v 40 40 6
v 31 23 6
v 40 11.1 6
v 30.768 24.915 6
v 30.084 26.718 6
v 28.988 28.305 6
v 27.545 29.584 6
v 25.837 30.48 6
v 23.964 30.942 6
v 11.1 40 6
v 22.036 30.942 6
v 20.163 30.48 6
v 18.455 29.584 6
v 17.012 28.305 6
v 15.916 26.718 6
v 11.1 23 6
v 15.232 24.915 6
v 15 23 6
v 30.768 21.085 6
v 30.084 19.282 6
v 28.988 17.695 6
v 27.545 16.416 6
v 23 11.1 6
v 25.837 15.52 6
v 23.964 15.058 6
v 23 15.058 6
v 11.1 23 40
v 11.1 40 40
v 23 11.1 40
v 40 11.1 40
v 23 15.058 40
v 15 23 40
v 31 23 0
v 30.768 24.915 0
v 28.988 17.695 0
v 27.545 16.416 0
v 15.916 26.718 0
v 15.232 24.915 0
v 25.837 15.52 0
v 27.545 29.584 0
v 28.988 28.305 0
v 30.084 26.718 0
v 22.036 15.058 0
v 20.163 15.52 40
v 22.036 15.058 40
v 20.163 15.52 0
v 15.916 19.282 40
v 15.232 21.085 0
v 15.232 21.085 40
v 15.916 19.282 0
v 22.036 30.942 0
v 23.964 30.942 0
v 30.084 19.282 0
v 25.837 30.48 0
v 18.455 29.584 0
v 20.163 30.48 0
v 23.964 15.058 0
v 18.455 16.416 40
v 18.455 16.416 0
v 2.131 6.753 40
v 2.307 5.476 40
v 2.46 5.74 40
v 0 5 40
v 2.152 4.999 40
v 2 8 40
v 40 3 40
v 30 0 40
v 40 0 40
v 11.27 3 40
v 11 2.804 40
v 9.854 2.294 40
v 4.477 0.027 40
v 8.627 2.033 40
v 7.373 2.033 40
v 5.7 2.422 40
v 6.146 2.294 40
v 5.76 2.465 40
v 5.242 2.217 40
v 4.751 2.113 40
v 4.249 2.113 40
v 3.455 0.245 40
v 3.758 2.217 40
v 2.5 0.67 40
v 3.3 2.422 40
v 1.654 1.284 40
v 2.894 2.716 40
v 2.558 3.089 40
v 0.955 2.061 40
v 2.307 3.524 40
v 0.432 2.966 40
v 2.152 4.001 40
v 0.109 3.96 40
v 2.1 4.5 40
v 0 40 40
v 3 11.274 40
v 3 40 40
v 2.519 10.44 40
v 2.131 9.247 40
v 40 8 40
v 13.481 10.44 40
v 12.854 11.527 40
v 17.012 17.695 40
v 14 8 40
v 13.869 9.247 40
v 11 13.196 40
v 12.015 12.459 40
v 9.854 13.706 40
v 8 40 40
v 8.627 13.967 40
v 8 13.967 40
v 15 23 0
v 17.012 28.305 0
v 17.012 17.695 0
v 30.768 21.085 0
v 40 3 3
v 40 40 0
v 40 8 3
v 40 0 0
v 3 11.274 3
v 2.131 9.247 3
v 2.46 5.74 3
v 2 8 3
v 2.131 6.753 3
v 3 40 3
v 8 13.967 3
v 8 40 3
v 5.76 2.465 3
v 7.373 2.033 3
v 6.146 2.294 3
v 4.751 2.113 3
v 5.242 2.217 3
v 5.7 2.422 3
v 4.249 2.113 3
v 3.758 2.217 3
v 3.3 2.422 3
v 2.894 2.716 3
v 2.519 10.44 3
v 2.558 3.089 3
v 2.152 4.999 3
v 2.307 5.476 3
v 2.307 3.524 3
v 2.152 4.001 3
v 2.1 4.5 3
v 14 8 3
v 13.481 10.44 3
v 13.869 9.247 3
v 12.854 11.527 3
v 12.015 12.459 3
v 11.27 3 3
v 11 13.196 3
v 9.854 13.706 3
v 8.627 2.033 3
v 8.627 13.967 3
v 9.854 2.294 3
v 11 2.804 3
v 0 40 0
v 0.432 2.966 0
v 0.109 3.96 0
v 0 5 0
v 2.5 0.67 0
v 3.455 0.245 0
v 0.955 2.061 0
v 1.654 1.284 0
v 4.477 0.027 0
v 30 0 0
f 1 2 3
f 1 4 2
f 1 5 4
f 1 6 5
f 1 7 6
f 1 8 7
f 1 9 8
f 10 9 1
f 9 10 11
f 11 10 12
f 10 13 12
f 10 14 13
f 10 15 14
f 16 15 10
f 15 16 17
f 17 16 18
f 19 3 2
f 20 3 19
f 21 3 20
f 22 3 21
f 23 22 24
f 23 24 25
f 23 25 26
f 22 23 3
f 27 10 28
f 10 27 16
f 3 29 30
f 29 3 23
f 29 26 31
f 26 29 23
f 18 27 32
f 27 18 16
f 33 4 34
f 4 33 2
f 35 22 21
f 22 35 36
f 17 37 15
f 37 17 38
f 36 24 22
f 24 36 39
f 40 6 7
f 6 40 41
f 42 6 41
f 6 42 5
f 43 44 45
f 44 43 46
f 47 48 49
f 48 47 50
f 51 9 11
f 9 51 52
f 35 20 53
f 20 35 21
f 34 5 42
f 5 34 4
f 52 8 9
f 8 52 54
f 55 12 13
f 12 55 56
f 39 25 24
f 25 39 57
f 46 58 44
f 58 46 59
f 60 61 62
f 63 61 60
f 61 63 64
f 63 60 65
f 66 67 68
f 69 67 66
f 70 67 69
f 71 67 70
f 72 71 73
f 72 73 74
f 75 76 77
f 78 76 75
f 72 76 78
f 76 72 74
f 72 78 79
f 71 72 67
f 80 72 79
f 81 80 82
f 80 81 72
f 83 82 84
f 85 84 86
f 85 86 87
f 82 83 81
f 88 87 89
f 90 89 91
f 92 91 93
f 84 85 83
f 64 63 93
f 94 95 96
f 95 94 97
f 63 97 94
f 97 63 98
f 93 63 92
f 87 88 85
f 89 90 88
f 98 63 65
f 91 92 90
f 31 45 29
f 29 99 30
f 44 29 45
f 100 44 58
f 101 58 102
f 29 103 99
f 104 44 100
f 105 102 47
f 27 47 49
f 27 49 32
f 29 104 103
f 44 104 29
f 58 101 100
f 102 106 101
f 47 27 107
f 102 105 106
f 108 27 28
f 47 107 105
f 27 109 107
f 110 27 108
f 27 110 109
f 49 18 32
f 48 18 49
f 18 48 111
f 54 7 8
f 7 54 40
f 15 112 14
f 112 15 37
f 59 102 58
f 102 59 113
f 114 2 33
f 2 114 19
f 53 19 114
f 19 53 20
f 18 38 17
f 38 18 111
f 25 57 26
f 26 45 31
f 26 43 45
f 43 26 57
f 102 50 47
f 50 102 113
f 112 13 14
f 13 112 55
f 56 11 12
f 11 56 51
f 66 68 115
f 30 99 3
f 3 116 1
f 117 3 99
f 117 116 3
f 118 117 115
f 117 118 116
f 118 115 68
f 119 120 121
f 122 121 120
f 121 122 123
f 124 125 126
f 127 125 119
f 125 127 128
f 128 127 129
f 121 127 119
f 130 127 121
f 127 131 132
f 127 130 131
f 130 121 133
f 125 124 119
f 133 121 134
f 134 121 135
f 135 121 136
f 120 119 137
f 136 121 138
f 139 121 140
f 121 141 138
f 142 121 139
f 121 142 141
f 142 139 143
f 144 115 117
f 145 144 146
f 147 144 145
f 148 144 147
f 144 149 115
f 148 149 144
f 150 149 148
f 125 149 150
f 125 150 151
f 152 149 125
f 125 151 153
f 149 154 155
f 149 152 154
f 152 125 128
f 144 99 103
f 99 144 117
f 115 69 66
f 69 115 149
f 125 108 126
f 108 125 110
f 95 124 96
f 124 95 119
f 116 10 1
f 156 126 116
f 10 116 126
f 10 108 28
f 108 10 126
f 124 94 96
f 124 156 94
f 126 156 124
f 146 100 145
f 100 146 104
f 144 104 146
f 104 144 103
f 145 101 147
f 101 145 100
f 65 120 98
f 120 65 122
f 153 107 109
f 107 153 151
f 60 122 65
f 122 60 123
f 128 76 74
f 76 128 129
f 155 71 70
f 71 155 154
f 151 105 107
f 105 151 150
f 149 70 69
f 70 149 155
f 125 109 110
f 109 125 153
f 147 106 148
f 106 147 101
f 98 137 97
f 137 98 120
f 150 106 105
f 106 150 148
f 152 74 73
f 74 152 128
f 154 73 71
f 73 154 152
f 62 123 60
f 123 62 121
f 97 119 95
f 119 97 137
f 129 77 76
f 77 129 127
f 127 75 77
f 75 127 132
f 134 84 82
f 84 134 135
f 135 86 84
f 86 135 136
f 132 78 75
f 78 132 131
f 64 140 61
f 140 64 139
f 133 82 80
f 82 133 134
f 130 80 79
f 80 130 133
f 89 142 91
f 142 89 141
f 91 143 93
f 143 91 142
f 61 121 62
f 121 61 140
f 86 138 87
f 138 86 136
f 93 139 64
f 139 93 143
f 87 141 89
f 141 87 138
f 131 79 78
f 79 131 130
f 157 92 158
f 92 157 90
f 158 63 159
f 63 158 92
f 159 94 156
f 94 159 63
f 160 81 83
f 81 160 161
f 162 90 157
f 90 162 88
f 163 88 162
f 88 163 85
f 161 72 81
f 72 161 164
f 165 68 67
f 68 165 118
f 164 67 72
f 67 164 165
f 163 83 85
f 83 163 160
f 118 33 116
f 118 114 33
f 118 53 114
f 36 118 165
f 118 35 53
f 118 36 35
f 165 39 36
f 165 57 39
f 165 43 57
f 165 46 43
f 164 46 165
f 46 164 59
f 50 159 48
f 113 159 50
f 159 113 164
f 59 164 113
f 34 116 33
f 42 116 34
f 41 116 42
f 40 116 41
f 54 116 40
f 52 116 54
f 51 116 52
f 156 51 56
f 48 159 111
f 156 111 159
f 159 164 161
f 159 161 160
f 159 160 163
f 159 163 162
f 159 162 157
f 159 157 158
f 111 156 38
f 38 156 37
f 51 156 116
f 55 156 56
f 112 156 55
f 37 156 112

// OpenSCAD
tubing_dia     = 16;//based on tubing OD of 16 mm
tubing_offset  = tubing_dia/2 +7;//offset of center of tubing compared to aquarium inner corner
aquarium_walls_thickness = 5;//5mm thick glass 

angle_mount_thickness = 3;

cornerTubingHolder(tubingDia=tubing_dia,tubingOffset=tubing_offset,thickness=angle_mount_thickness,mountHeight=40,snapOnThickness=aquarium_walls_thickness);

//sideTubingHolder(tubingDia=tubing_dia, height =30, length=20, thickness=3, snapOnThickness= angle_mount_thickness);

//clip(height=40,length=20,innerDistance=5,thickness=3);
//steppedConnector2(id=15.5,minOd=17.5,maxOd=20.5,length=15);


module cornerTubingHolder(tubingDia, tubingOffset, thickness, mountHeight, snapOnThickness){
  width = 40;
  length=40;
  height= mountHeight;
  clearance = 0.1;
  baseThickness = thickness *2;

  offset = snapOnThickness+thickness;
  offset2 = thickness*1.5;
  cornerDia = 10;

  rheight = mountHeight -thickness;
  mountOffset = thickness;

  wallsPlusCutout = snapOnThickness +thickness*2;
  aquariumInnerStart = wallsPlusCutout - thickness;

  tubeXOffset = aquariumInnerStart + tubingOffset;
  tubeYOffset = aquariumInnerStart + tubingOffset;

  module body(){
    union(){   
      //base, with rounded corners
      hull(){
        translate([cornerDia/2,cornerDia/2,0]) cylinder(r=cornerDia/2,h=height, $fn=30);
        translate([width - cornerDia,length - cornerDia,0]) cube([cornerDia,cornerDia,height]);

        translate([width - cornerDia,0,0]) cube([cornerDia,cornerDia,height]);
        translate([0,length - cornerDia,0]) cube([cornerDia,cornerDia,height]);
      }
    }
    
  }

  module holes(){
    //main tubing hole
    translate([tubeXOffset,tubeYOffset,- clearance]) cylinder(h=height + clearance,r=tubingDia/2);

    //main cutout
    cutoutWidth = width-wallsPlusCutout;
    cutoutLength = length-wallsPlusCutout;
    difference(){
      translate([width-cutoutWidth+ clearance ,length-cutoutLength +clearance ,baseThickness]) cube([cutoutWidth,cutoutLength,rheight + clearance]);

      //tubing stabilizer
      translate([aquariumInnerStart,aquariumInnerStart,thickness]) #cube([tubeXOffset - tubingDia/2 ,tubeXOffset - tubingDia/2 ,rheight + clearance]);
    }

    //mount cutouts
    mountLenOffset = thickness + snapOnThickness/2;
    mountLengthW = width - mountLenOffset;
    mountLengthL = length - mountLenOffset;
    translate([mountLenOffset,mountOffset,thickness]) cube([mountLengthW,snapOnThickness,mountHeight]);
    translate([mountOffset,mountLenOffset,thickness]) cube([snapOnThickness,mountLengthL,mountHeight]);

    //corner cutouts, to not damage silicone joints
    translate([offset,offset,thickness]) cylinder(h=mountHeight,r=thickness*2,$fn=30);
    translate([offset2,offset2,thickness]) cylinder(h=mountHeight,r=thickness*0.8,$fn=30);
  }

  difference () {
    body();
    holes();
  }
}


module sideTubingHolder(tubingDia, height, length, thickness, snapOnThickness, tubingMountHeight=20, holesNb){
  tubingDia = 20;
  od = tubingDia + thickness*2;
  clearance = 0.1;

  module body(){
   
    clip(height=height,length=length,innerDistance=snapOnThickness,thickness=thickness);

    translate([snapOnThickness+thickness*3,length/2+5,tubingMountHeight]) rotate([0,90,90]) steppedConnector2(id=15.5,minOd=17.5,maxOd=20.5,length=15);

    mirror([0,1,0])translate([snapOnThickness+thickness*3,-length/2+5,tubingMountHeight]) rotate([0,90,90]) steppedConnector2(id=15.5,minOd=17.5,maxOd=20.5,length=15);

    hull(){
      translate([snapOnThickness+thickness*3,0,tubingMountHeight]) rotate([0,90,90]) cylinder(h=length,r=tubingDia/2 );

      translate([thickness,0,tubingMountHeight-tubingDia/2]) cube(size=[thickness,length,tubingDia]);
    }

  }

  module holes(){
    translate([snapOnThickness+thickness*3,-clearance,tubingMountHeight]) rotate([0,90,90]) cylinder(h=length+clearance*2,r=(tubingDia-thickness*2)/2 );
  }

  difference () {
    body();
    holes();
  }
}


module clip(height,length,innerDistance,thickness)
{
  dia = innerDistance+thickness*2;
  id  = innerDistance;
  clearance = 0.1;

  difference(){
    hull(){
      translate([0,length,height])  rotate([90,0,0]) cylinder(r=dia/2,h=length);
      translate([-dia/2,0,0])cube([dia,length,height]);
      //cube([thickness,length,height]);
    }

    hull(){
      translate([0,length,height])  rotate([90,0,0]) rotate([0,0,45])cylinder(r=id/2,h=length+clearance,$fn=4);
      translate([-id/2,0,-clearance])cube([id,length+clearance,height]);
    }
  }
}


module steppedConnector(minId,maxId,thickness,length,steps=4,stepDepth=0.5){
  minOD = minId + thickness * 2;
  maxOD = maxId + thickness * 2;
  clearance = 0.1;

  stepLength = length/steps;

  difference(){
    union(){
      for ( i = [0 : steps] )
      {
        minI = (minOD-stepDepth*i) /2;
        maxI = (maxOD-stepDepth*i) /2;

        translate([0,0,stepLength*i])
         cylinder(r1 = maxI, r2 = minI, h=stepLength);
      }
    }
   
    cylinder(r1 = minId/2, r2 = maxId/2,h=length*2+clearance*2);
  }
}

module steppedConnector2(id,minOd,maxOd,length,tipLength=1.5,steps=3,stepDepth=0.5,stepDistance=0){
  //minOD = minId + thickness * 2;
  //maxOD = maxId + thickness * 2;
  clearance = 0.1;
  minOD = minOd;
  maxOD = maxOd;

  stepLength = length/steps;

  difference(){
    union(){

      //translate([0,0,tipLength])
      for ( i = [0 : steps-1] )
      {
        minI = (minOD-stepDepth*i) /2;
        maxI = (maxOD-stepDepth*(i+1)) /2;

        translate([0,0,(stepLength+stepDistance)*i])
          cylinder(r2 = minI, r1 = maxI, h=stepLength);
      }

      tipOd = (minOD-stepDepth*steps) /2;
      translate([0,0,length ]) cylinder(r2 = tipOd, r1 = tipOd, h=tipLength);

      cylinder(r = minOd/2, h=length);
    }

    //cylinder(r2 = minOd, r1 = maxOd, h=length);
   
    translate([0,0,-clearance]) cylinder(r2 = id/2, r1 = id/2,h=length*2+clearance*2);
  }
}
